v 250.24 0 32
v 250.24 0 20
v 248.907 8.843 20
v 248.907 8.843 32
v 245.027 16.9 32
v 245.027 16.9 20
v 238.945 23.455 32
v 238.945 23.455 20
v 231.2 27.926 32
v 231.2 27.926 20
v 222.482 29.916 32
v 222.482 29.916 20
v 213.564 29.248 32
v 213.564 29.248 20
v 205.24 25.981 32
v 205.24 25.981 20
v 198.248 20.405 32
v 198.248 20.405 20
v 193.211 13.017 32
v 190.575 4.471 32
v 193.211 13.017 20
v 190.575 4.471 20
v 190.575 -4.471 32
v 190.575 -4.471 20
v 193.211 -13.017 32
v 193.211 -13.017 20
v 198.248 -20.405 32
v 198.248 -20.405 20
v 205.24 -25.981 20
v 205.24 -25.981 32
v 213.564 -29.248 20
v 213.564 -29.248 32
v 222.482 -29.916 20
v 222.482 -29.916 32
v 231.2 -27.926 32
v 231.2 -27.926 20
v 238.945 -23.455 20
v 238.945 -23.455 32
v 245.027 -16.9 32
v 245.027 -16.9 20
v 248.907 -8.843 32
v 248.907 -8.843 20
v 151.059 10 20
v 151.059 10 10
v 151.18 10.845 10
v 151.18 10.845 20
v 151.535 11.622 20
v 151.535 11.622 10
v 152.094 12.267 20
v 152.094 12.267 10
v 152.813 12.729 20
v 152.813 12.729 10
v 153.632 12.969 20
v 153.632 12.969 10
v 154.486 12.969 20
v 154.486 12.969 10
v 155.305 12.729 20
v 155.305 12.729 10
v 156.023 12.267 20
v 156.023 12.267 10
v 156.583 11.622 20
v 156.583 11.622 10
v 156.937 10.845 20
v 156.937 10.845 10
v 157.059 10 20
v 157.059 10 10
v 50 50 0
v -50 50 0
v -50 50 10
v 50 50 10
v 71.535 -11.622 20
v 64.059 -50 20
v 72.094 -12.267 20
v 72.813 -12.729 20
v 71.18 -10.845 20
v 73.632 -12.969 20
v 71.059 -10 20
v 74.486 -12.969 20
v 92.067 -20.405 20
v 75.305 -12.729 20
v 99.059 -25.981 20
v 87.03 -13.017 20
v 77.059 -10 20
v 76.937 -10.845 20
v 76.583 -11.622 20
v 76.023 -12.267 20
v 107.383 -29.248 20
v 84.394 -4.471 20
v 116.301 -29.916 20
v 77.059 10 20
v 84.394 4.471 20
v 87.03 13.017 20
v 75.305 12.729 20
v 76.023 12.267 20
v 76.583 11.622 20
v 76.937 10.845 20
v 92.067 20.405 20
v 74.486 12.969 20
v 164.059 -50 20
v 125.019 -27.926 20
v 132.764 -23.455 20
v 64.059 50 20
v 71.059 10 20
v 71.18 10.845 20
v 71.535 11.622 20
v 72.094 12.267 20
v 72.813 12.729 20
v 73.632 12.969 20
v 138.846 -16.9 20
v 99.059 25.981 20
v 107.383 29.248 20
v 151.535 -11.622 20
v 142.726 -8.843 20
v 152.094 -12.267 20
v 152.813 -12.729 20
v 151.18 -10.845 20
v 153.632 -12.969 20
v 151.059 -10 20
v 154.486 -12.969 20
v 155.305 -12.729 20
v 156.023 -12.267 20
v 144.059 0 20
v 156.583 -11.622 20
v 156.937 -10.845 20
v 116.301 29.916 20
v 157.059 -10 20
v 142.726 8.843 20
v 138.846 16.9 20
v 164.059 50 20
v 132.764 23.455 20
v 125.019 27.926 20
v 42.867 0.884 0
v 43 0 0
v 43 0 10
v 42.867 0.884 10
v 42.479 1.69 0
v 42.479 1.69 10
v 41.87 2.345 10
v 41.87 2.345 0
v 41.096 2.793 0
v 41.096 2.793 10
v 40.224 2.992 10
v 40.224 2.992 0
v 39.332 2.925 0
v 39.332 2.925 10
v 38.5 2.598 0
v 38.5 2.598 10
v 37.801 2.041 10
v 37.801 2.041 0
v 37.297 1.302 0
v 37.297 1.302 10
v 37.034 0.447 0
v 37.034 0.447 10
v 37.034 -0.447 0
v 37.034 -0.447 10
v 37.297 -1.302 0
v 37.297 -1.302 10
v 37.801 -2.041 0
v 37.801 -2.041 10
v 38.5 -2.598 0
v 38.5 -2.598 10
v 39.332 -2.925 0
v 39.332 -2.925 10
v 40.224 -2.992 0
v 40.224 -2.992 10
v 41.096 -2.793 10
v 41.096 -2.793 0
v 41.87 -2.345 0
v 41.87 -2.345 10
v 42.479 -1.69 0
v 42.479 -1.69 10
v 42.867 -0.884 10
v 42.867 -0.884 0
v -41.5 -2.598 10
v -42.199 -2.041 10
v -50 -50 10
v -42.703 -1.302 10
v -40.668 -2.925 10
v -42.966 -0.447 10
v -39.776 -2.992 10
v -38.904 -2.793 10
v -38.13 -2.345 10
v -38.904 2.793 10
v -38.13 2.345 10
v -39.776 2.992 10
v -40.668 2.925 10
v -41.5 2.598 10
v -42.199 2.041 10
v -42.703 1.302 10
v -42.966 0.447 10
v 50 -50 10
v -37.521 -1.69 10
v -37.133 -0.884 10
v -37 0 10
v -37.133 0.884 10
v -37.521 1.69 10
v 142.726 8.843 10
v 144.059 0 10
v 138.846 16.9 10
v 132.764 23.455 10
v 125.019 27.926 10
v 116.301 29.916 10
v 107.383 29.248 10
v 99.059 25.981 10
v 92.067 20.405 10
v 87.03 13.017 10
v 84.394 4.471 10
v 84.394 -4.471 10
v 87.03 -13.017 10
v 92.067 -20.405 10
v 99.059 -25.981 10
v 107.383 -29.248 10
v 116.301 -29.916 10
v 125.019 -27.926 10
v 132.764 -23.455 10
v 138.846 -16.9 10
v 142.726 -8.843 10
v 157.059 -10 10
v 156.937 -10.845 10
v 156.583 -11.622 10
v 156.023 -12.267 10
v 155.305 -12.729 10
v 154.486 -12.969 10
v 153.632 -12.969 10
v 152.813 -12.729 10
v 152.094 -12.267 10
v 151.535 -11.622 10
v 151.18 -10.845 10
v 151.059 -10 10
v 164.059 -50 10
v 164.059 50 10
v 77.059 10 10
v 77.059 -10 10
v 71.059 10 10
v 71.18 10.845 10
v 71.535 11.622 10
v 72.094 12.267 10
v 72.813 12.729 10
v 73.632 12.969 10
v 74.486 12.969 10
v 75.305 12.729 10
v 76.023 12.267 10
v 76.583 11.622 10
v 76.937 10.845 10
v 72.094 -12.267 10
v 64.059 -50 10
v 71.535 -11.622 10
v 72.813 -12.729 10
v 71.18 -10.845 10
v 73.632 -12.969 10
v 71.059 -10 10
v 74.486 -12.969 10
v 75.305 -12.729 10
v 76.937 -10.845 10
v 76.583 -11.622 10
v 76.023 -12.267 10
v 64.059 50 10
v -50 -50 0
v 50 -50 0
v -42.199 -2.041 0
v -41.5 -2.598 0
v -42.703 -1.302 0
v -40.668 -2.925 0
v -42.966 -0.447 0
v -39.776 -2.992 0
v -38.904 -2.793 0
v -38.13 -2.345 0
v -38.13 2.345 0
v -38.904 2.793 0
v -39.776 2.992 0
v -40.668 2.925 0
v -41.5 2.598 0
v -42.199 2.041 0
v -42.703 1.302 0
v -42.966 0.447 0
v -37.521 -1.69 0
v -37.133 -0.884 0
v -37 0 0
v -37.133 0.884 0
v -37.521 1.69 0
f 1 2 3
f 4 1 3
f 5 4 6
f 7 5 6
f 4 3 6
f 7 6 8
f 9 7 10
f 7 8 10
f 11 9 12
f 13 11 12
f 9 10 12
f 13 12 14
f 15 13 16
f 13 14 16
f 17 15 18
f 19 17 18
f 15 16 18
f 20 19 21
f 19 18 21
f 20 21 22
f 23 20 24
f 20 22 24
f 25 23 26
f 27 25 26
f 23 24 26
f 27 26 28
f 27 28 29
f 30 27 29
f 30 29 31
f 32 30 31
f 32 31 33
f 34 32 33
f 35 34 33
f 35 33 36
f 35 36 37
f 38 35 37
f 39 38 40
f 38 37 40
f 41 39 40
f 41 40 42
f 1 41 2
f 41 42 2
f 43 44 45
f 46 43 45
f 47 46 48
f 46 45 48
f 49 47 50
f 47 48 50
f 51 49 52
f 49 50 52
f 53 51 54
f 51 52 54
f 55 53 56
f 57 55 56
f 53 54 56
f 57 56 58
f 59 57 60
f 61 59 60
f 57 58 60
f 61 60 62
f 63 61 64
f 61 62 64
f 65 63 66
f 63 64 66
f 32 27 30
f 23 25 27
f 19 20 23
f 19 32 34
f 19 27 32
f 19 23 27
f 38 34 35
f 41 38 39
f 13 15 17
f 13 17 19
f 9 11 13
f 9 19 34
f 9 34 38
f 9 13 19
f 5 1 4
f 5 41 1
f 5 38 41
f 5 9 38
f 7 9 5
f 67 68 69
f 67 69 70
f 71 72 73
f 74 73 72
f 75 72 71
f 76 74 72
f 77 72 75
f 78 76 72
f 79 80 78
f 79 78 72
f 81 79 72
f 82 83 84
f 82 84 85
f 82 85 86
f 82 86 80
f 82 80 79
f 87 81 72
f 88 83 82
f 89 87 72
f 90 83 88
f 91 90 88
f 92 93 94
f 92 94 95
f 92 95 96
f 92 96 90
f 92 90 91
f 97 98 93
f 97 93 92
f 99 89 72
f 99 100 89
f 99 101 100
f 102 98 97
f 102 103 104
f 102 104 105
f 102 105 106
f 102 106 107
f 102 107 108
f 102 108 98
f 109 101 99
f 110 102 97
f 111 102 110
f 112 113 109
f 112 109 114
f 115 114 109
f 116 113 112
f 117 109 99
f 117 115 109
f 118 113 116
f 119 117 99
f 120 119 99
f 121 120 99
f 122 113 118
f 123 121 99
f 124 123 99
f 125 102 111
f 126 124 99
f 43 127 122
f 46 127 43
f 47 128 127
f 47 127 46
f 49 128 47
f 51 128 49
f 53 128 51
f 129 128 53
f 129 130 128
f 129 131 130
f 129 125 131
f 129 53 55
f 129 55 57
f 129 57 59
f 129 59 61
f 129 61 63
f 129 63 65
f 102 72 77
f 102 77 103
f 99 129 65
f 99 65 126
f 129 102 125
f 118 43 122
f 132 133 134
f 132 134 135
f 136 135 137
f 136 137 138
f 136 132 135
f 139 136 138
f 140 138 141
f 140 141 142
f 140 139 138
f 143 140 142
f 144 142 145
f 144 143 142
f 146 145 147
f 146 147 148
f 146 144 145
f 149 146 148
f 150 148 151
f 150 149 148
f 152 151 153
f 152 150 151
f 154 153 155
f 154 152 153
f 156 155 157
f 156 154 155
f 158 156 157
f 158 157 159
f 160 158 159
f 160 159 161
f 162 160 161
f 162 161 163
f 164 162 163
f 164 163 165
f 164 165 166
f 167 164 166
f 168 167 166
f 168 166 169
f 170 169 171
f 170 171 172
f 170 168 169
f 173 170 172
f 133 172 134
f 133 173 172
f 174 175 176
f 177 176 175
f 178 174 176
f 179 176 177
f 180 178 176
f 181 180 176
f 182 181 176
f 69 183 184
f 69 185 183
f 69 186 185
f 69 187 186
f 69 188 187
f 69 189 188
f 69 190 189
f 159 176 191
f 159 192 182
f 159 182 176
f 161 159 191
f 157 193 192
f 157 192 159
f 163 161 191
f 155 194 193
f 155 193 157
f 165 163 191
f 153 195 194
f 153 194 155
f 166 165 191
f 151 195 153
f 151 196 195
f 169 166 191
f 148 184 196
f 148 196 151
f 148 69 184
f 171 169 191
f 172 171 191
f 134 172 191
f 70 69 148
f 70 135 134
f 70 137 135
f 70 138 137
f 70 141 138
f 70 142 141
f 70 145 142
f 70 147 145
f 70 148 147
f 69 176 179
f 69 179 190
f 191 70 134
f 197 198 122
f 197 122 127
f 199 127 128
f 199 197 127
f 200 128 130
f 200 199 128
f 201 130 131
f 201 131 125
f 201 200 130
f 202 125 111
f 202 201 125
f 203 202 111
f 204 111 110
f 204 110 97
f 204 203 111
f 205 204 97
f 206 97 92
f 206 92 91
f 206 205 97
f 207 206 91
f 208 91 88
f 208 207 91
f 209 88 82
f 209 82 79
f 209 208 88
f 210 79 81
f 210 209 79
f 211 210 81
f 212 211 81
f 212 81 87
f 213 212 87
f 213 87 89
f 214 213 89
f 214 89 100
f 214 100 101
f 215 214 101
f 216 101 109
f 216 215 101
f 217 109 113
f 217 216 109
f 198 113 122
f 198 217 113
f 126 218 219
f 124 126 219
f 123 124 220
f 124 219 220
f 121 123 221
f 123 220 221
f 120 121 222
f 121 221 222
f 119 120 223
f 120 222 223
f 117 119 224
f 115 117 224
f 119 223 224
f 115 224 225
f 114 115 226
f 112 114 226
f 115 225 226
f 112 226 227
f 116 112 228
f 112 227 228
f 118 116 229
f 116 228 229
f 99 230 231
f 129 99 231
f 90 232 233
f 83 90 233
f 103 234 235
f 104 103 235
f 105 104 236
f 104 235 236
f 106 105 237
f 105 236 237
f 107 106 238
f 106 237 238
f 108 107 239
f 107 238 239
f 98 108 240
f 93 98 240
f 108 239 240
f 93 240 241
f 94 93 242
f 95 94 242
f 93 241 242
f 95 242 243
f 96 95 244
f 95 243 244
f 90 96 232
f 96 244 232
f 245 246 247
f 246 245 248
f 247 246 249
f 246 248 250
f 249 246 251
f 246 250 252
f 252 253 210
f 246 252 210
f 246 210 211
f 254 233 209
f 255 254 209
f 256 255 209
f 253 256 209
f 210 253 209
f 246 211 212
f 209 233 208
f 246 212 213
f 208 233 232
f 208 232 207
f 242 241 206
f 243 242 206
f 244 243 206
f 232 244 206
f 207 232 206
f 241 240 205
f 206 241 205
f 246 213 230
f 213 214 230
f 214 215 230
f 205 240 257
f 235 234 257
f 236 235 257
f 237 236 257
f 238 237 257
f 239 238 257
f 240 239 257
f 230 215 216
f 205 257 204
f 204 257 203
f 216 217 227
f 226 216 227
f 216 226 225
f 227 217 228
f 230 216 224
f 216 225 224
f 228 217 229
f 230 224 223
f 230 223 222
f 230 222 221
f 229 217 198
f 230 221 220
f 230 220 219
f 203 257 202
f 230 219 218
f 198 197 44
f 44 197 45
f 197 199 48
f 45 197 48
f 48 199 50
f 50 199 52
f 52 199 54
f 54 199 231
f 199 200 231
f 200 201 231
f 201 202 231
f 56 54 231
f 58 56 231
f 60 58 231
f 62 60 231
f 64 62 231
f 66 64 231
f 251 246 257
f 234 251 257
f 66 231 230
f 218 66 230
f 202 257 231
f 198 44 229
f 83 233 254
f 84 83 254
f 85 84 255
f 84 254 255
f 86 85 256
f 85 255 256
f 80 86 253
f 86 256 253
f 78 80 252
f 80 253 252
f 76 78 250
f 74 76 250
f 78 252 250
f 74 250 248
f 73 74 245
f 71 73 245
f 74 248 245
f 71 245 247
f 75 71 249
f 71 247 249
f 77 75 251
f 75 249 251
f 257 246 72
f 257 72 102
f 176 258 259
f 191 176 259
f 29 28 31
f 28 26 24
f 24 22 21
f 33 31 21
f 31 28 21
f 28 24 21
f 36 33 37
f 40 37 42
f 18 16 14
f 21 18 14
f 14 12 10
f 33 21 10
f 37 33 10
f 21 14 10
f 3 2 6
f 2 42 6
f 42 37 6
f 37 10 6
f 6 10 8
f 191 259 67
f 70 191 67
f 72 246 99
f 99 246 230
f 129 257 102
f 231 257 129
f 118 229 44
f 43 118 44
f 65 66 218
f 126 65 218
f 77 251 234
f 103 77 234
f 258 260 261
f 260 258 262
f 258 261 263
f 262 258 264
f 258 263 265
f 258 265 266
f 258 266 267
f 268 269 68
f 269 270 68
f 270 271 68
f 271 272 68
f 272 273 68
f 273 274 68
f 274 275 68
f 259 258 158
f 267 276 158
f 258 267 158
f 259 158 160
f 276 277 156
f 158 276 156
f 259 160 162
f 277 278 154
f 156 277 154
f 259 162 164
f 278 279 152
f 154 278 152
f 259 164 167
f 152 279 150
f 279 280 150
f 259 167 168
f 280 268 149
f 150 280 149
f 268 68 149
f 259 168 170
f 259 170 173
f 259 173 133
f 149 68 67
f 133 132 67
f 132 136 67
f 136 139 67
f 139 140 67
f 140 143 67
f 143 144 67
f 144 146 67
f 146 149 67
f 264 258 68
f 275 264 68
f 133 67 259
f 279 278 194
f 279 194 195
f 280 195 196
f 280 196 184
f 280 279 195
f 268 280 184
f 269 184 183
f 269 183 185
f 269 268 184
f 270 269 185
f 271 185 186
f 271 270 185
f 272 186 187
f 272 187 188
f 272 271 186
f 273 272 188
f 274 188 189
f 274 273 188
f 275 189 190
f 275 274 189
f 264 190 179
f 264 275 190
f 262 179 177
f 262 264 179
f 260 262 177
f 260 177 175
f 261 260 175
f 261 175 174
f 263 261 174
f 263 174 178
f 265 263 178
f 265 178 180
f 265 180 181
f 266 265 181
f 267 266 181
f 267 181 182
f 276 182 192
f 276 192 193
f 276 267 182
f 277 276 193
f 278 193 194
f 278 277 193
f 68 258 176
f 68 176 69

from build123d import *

# Parameters (mm, degrees)
F0_W     = 100
F0_H     = 100
F0_R     = 3
F1_DEPTH = 10
F2_W     = 100
F2_H     = 100
F2_R     = 30
F3_DEPTH = 10
F4_R     = 30
F5_DEPTH = 12


with BuildPart() as f1:
    # F0 (on Top) → F1 (new body)
    with BuildSketch(Plane.XY):
        Rectangle(F0_W, F0_H)
        with Locations((-40, 0)):
            Circle(F0_R, mode=Mode.SUBTRACT)
        with Locations((40, 0)):
            Circle(F0_R, mode=Mode.SUBTRACT)
    extrude(amount=F1_DEPTH)


with BuildPart() as f3:
    # F2 (on face) → F3 (new body)
    with BuildSketch(Plane.XY.offset(10)):
        with Locations((114.058882, 0)):
            Rectangle(F2_W, F2_H)
        with BuildLine():
            Line((71.058882, -10), (71.058882, 10))
            ThreePointArc((71.058882, 10), (74.058882, 13), (77.058882, 10))
            Line((77.058882, 10), (77.058882, -10))
            ThreePointArc((77.058882, -10), (74.058882, -13), (71.058882, -10))
        make_face(mode=Mode.SUBTRACT)
        with Locations((114.058882, 0)):
            Circle(F2_R, mode=Mode.SUBTRACT)
        with BuildLine():
            Line((151.058882, -10), (151.058882, 10))
            ThreePointArc((151.058882, 10), (154.058882, 13), (157.058882, 10))
            Line((157.058882, 10), (157.058882, -10))
            ThreePointArc((157.058882, -10), (154.058882, -13), (151.058882, -10))
        make_face(mode=Mode.SUBTRACT)
    extrude(amount=F3_DEPTH)


with BuildPart() as f5:
    # F4 (on face) → F5 (new body)
    with BuildSketch(Plane.XY.offset(20)):
        with Locations((220.240012, 0)):
            Circle(F4_R)
    extrude(amount=F5_DEPTH)


solid = Compound([f1.part, f3.part, f5.part])
